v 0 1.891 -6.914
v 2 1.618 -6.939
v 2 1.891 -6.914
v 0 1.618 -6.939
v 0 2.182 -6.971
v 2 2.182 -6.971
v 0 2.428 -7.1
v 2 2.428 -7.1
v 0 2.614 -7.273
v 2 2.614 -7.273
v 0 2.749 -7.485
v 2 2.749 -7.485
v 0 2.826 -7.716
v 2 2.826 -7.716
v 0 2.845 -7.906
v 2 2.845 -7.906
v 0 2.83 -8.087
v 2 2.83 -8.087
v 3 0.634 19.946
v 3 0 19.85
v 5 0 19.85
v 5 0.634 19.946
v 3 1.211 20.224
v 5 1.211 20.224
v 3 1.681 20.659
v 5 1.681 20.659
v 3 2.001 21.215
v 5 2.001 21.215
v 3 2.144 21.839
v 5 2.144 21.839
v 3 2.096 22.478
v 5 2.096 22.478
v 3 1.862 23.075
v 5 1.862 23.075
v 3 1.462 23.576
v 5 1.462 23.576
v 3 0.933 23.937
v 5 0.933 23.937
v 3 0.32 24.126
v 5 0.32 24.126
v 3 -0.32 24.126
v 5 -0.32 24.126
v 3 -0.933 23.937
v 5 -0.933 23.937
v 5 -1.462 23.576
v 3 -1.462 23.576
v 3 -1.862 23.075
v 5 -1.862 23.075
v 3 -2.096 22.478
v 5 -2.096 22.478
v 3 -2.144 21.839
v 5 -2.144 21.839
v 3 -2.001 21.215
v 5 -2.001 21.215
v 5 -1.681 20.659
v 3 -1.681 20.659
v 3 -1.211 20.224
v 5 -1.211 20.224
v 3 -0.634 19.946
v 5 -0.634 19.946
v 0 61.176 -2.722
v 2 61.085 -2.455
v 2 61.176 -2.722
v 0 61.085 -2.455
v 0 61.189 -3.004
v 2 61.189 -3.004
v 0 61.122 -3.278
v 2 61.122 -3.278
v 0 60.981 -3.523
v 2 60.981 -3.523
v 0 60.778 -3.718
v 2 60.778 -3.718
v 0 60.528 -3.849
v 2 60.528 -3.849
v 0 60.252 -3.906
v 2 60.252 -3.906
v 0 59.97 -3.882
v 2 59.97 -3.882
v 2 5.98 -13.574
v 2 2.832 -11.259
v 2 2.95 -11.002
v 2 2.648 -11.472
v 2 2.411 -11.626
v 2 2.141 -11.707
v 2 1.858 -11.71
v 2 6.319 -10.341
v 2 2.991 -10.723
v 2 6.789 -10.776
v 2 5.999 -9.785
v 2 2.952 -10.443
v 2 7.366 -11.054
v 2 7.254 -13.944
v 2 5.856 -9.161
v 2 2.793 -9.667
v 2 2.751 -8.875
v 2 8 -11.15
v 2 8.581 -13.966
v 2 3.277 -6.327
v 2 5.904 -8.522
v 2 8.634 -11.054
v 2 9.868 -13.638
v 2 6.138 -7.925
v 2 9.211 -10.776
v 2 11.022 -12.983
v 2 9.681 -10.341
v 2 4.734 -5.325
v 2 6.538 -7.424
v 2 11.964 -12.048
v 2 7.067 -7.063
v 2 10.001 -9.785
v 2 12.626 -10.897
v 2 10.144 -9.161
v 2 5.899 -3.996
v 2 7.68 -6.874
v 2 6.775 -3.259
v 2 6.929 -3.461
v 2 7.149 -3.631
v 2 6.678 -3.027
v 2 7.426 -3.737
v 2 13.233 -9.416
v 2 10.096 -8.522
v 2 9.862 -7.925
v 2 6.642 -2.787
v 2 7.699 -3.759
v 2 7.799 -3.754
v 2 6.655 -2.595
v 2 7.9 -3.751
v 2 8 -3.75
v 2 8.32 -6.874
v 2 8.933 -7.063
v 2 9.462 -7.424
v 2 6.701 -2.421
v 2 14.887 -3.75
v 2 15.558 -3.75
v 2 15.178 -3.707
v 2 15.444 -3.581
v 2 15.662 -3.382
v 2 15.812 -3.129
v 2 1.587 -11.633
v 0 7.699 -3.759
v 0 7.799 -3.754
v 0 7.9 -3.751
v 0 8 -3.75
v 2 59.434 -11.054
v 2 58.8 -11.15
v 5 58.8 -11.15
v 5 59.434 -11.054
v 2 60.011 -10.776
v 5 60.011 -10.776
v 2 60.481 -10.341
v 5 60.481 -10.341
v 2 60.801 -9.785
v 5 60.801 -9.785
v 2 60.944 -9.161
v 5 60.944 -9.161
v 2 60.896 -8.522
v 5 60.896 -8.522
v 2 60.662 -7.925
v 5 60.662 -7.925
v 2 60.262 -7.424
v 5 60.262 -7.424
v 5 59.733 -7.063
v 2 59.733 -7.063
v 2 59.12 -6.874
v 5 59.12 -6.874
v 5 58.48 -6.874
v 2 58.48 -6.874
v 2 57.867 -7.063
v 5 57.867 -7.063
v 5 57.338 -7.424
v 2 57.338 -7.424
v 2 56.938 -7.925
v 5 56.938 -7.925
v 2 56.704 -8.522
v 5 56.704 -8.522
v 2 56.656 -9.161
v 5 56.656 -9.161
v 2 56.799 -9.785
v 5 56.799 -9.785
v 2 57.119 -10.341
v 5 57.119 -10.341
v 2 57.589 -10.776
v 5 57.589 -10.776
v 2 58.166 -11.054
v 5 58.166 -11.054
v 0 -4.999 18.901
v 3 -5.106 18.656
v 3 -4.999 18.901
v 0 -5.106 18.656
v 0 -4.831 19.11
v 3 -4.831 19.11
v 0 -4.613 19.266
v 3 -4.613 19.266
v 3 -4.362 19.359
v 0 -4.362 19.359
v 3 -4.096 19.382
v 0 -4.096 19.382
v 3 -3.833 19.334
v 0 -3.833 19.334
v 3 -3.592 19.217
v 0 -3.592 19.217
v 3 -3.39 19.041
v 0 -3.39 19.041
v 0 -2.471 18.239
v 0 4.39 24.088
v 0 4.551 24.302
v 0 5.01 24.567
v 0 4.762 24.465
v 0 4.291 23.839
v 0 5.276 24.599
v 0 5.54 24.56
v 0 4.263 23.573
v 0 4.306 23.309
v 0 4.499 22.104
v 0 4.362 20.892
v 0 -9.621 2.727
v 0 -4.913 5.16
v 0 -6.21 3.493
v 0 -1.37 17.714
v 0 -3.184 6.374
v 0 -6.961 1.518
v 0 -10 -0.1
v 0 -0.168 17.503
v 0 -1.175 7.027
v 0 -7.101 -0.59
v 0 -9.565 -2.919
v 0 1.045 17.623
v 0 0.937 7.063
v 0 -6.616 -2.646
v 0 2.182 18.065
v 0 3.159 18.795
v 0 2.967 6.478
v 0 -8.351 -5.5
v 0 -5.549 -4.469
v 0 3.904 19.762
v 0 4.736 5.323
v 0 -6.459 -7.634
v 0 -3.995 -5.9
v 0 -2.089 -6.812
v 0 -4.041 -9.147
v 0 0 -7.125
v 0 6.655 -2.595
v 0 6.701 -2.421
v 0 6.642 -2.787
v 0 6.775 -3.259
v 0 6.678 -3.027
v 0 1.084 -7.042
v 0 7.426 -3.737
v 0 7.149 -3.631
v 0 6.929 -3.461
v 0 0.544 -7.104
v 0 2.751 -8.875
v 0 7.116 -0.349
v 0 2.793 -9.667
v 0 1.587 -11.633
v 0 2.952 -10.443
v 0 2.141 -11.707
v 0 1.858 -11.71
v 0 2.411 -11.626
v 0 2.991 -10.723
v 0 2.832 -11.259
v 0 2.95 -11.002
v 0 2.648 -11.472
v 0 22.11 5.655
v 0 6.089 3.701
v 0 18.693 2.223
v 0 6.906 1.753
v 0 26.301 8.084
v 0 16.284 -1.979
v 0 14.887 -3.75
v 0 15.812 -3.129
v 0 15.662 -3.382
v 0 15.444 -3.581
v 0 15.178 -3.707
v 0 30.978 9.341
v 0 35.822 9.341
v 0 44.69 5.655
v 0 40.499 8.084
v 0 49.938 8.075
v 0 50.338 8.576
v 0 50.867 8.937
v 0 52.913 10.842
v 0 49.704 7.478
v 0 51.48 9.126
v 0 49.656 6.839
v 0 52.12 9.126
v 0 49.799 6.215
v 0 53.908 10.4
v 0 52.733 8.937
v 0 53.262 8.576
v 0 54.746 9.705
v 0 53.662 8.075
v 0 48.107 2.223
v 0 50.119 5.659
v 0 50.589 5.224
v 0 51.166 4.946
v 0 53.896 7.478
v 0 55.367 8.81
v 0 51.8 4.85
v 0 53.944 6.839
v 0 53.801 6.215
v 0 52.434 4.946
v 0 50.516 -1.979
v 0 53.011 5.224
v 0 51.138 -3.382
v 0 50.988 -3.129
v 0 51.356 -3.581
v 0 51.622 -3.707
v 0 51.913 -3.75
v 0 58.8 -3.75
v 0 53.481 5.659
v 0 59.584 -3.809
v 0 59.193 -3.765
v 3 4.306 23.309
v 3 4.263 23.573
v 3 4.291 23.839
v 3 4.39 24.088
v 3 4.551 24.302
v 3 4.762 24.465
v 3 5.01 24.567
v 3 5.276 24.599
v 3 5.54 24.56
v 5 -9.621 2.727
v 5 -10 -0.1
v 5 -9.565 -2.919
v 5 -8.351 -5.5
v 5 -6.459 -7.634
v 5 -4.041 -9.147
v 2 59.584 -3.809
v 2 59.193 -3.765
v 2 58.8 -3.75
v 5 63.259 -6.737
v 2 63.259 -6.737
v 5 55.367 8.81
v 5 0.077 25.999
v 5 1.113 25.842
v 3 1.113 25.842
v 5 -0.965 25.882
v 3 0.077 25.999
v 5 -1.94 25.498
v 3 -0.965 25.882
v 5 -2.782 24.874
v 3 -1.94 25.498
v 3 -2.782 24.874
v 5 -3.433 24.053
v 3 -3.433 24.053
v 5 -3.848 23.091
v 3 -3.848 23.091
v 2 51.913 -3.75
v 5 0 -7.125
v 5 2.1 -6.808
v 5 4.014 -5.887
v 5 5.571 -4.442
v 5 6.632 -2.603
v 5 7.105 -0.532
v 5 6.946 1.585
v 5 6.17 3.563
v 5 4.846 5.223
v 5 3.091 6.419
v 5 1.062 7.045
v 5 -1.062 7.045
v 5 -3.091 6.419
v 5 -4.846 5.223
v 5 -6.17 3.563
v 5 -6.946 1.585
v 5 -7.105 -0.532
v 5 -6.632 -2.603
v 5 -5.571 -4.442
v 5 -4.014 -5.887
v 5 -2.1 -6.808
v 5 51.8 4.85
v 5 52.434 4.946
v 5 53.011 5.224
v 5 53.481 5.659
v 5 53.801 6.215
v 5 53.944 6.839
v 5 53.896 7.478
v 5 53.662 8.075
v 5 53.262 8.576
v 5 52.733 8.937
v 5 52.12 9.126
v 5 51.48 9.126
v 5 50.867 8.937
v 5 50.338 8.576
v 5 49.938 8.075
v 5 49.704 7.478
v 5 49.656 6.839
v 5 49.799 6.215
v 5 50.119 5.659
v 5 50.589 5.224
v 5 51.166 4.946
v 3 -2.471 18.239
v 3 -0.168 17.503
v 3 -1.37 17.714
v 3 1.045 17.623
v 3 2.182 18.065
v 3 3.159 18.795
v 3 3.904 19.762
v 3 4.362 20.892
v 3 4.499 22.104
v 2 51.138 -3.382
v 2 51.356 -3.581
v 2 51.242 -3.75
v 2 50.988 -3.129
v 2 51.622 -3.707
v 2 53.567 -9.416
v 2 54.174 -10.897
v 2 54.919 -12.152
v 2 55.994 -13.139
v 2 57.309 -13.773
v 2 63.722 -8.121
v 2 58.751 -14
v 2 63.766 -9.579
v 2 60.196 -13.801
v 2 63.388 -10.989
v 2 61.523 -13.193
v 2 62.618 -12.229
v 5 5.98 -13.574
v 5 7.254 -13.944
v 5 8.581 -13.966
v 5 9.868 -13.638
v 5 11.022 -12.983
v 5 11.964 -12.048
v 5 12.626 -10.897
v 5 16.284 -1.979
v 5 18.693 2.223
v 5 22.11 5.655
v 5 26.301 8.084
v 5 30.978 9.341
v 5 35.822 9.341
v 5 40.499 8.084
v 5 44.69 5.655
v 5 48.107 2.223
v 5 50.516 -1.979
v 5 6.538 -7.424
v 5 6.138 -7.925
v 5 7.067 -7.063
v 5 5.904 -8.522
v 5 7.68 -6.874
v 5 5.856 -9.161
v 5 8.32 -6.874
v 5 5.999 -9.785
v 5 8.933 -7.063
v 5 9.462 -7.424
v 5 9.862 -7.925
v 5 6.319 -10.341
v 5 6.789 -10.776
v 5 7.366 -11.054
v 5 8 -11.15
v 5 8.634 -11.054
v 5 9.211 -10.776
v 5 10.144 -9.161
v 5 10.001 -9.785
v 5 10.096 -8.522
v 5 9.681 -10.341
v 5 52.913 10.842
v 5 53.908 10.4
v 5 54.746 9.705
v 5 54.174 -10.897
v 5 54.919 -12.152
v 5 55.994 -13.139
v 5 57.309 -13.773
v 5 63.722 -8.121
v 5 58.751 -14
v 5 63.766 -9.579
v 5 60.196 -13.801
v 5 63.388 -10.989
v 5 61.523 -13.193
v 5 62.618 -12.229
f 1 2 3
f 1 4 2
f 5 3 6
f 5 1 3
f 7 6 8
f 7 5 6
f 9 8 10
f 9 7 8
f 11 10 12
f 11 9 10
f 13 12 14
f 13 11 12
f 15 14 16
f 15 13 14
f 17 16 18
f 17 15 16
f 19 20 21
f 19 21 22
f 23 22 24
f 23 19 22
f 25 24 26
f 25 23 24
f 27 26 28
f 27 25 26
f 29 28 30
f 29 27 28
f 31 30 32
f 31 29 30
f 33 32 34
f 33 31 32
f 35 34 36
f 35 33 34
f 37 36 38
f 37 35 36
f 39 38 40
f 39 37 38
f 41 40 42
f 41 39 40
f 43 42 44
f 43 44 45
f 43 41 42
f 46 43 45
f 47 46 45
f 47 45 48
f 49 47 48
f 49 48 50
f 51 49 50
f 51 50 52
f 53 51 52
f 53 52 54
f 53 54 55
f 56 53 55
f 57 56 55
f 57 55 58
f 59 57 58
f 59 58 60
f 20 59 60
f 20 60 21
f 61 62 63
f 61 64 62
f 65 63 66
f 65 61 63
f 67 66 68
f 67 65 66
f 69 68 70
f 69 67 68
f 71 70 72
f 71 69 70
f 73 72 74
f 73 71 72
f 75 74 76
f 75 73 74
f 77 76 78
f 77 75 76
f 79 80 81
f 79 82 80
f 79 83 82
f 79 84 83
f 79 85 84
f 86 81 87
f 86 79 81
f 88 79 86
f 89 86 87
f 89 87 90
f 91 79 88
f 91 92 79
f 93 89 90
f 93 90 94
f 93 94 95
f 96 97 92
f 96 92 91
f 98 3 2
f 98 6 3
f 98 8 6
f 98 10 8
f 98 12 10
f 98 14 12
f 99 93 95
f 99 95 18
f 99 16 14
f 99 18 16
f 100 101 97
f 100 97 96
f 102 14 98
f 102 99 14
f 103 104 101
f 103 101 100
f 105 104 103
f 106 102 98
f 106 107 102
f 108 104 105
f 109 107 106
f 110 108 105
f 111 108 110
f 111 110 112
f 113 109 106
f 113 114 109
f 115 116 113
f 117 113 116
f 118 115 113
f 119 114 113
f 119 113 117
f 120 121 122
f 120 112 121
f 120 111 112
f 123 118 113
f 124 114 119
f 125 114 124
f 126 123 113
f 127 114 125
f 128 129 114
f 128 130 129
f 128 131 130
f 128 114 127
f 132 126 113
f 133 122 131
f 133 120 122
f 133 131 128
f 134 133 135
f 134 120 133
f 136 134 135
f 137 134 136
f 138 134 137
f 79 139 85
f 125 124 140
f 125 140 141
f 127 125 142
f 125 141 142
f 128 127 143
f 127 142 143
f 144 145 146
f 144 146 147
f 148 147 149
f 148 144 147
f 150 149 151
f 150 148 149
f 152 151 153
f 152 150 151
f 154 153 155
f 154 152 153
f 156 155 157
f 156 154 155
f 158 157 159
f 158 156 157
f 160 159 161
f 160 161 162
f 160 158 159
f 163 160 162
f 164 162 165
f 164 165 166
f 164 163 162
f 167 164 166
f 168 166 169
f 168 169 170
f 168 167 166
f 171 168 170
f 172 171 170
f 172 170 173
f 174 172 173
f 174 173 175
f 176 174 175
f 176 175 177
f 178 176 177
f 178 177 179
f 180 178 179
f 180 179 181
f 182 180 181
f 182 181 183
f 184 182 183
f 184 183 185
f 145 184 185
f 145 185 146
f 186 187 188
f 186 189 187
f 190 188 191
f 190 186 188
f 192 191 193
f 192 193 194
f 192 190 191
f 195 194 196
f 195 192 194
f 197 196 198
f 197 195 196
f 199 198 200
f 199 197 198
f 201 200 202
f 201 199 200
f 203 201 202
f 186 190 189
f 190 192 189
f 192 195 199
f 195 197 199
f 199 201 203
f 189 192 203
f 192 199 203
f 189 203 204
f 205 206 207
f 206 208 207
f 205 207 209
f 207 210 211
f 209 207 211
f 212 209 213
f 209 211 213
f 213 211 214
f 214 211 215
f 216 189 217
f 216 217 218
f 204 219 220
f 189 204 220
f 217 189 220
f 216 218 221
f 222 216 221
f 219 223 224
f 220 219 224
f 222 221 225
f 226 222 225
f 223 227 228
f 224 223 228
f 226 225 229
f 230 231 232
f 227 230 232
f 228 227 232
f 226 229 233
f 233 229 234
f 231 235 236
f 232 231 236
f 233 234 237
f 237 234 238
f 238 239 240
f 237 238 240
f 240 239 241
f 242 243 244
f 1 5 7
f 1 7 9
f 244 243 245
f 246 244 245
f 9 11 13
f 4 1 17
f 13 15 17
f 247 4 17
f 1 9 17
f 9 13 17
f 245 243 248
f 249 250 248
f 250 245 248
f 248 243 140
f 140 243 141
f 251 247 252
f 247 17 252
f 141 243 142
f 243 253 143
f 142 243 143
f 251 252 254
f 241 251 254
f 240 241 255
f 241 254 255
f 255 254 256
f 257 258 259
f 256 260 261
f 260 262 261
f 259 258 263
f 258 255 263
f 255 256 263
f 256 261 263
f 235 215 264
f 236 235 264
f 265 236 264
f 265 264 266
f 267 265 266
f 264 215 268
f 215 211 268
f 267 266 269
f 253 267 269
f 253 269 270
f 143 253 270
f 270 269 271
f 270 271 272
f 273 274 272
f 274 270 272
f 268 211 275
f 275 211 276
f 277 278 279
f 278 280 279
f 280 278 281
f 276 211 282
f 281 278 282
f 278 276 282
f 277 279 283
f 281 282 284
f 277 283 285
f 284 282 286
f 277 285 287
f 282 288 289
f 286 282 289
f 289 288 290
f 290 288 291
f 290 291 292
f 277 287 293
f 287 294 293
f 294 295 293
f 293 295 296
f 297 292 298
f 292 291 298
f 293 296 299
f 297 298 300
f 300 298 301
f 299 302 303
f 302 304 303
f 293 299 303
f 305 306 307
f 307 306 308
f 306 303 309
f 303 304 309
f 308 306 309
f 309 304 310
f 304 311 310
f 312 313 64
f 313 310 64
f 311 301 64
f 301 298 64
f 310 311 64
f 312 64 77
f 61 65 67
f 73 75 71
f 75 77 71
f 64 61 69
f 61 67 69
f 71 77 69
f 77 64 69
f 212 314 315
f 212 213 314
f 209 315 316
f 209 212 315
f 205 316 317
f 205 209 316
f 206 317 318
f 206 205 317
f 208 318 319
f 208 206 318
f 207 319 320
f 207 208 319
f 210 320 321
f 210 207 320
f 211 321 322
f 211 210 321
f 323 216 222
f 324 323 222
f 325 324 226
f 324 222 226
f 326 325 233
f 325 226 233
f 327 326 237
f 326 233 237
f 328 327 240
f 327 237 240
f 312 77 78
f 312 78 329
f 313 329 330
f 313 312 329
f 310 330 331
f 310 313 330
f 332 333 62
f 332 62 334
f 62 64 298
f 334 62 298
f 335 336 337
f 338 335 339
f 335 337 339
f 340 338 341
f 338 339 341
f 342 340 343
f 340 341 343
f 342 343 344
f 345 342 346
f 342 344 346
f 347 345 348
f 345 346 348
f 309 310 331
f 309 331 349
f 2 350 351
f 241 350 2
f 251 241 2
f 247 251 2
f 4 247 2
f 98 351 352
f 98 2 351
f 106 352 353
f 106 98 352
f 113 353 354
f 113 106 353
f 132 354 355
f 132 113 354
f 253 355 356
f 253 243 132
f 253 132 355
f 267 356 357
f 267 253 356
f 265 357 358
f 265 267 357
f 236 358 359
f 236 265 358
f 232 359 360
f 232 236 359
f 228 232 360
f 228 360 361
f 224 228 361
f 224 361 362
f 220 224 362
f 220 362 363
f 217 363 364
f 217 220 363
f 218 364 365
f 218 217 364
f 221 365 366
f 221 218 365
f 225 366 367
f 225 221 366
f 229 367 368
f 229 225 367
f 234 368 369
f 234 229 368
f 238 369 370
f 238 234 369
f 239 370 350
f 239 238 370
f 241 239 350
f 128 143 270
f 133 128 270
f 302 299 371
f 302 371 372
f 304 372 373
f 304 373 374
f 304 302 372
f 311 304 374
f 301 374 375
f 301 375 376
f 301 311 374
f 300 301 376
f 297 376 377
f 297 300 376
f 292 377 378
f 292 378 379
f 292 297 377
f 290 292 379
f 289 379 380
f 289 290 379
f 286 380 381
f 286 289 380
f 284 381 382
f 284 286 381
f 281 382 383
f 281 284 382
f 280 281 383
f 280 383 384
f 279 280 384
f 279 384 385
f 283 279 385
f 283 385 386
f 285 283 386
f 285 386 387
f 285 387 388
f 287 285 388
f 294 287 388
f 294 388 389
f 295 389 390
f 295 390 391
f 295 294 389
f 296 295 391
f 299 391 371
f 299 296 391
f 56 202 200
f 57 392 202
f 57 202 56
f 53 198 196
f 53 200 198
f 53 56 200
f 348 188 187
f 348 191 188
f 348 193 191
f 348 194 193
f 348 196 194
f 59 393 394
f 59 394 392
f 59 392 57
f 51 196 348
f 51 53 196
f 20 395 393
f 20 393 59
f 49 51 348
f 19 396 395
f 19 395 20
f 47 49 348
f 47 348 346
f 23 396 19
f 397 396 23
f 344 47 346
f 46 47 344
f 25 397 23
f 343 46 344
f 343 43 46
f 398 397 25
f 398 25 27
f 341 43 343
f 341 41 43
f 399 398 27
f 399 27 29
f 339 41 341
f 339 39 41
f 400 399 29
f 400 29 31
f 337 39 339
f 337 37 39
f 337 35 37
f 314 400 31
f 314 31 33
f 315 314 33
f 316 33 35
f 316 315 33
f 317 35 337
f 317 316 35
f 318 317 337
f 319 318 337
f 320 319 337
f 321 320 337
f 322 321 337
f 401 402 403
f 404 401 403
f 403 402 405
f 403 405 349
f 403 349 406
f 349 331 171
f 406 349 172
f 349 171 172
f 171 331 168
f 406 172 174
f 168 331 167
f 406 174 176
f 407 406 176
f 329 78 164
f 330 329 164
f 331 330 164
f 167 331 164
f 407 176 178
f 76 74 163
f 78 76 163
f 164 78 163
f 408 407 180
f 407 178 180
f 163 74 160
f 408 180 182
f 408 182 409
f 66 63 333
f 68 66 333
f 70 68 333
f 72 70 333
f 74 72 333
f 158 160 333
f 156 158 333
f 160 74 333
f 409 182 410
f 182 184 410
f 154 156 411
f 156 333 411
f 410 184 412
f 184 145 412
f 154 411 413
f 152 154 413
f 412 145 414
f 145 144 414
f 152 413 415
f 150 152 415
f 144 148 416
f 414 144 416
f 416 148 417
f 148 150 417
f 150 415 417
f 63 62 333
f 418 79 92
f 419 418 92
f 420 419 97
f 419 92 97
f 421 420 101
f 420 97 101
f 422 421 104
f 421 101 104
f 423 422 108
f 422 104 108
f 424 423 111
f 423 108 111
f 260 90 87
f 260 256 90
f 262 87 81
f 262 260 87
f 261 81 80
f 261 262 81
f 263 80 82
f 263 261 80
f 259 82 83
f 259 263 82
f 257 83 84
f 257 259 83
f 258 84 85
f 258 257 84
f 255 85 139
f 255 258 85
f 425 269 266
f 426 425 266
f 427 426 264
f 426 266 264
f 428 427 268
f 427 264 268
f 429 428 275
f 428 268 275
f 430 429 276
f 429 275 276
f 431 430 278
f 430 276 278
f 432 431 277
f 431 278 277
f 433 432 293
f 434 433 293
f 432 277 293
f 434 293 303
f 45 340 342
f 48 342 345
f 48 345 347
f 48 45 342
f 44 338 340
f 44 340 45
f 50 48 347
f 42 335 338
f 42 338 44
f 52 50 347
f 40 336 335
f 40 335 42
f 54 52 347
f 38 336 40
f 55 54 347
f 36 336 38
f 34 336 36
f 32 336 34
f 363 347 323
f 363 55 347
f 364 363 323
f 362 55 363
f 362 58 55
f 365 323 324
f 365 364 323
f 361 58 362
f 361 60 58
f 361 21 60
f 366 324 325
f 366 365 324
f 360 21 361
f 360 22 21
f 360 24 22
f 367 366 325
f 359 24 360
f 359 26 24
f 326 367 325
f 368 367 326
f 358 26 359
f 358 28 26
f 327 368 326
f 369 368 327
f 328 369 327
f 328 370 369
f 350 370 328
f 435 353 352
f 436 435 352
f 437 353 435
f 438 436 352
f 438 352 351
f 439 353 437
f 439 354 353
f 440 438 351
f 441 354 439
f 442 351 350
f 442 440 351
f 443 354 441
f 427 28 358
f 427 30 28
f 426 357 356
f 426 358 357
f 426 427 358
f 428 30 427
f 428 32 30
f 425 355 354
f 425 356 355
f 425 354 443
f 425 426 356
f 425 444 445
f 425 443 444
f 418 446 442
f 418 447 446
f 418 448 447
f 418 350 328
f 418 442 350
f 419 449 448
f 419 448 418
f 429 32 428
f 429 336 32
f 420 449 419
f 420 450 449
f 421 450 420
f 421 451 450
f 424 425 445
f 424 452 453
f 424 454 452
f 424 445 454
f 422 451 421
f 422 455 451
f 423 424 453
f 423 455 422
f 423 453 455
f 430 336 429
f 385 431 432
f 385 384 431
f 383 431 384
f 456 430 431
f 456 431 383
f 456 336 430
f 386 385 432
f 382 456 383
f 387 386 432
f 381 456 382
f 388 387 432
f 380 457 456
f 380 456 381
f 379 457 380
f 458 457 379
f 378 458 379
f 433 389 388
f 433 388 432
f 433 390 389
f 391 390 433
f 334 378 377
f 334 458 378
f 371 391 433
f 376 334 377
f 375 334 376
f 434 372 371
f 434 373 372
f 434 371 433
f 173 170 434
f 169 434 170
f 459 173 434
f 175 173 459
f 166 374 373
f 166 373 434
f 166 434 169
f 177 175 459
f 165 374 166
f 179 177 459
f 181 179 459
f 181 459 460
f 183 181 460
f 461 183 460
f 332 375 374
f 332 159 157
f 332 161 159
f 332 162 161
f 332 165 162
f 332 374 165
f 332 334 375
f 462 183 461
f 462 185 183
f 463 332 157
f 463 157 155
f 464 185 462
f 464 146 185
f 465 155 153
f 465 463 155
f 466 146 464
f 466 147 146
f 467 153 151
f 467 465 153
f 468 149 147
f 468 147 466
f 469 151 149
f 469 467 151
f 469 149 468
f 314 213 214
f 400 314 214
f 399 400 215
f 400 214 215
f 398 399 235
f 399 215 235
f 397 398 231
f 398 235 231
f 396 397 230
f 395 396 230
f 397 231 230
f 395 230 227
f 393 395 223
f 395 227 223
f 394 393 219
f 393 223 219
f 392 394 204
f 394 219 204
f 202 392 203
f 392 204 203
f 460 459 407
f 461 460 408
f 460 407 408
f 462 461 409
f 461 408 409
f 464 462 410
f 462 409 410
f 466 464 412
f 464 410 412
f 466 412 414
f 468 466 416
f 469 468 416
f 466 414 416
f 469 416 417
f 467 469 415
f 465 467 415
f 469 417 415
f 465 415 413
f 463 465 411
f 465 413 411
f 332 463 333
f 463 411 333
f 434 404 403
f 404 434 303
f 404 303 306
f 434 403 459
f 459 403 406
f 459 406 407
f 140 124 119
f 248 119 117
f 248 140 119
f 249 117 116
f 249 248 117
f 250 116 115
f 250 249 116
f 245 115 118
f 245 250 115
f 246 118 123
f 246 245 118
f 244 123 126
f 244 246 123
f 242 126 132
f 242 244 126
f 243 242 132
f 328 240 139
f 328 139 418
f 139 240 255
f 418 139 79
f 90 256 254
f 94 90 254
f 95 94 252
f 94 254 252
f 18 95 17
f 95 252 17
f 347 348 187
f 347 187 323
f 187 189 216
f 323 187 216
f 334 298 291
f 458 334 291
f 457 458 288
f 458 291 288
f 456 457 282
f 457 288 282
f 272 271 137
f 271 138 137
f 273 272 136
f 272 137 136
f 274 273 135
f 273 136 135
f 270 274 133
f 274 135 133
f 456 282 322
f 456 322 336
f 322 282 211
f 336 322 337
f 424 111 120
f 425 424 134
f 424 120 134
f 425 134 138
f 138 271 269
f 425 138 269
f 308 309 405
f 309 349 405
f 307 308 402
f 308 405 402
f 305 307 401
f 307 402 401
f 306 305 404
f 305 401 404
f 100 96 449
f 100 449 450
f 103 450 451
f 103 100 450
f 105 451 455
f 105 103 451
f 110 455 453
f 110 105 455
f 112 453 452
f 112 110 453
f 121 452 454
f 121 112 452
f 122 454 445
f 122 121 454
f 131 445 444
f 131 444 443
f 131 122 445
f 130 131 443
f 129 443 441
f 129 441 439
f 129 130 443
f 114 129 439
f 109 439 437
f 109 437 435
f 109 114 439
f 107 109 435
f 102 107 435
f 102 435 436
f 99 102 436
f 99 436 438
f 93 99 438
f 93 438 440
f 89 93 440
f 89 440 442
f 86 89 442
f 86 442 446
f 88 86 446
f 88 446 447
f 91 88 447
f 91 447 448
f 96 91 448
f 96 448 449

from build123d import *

# Parameters (mm, degrees)
SKETCH_1_R          = 2.15
SKETCH_1_R_2        = 7.125
EXTRUDE_1_DEPTH     = 5
SKETCH_2_R          = 4.5
CUT_EXTRUDE_1_DEPTH = 3
FILLET_1_R          = 1
CUT_EXTRUDE_2_DEPTH = 2
FILLET_2_R          = 1


with BuildPart() as part:
    # 草图1 → 凸台-拉伸1 (new body)
    with BuildSketch(Plane(origin=(0, 0, 0), x_dir=(0, 0, -1), z_dir=(1, 0, 0))):
        with BuildLine():
            Line((-23.090909091, -3.848365543), (-2.727272727, -9.620913858))
            ThreePointArc((-2.727272727, -9.620913858), (4.253098654, -9.050477989), (9.147283393, -4.040693817))
            Line((9.147283393, -4.040693817), (13.573641697, 5.979653091))
            ThreePointArc((13.573641697, 5.979653091), (13.638118854, 9.867579581), (10.897437667, 12.625984252))
            Line((10.897437667, 12.625984252), (1.979480632, 16.283858268))
            ThreePointArc((1.979480632, 16.283858268), (-9.5, 33.4), (1.979480632, 50.516141732))
            Line((1.979480632, 50.516141732), (10.897437667, 54.174015748))
            ThreePointArc((10.897437667, 54.174015748), (13.545928712, 60.881953925), (6.736898846, 63.258516924))
            Line((6.736898846, 63.258516924), (-8.810480924, 55.366813539))
            ThreePointArc((-8.810480924, 55.366813539), (-10.081211961, 54.350712224), (-10.842152772, 52.912592502))
            Line((-10.842152772, 52.912592502), (-25.842152772, 1.112592502))
            ThreePointArc((-25.842152772, 1.112592502), (-25.498078189, -1.939961078), (-23.090909091, -3.848365543))
        make_face()
        with Locations((9, 58.8)):
            Circle(SKETCH_1_R, mode=Mode.SUBTRACT)
        with Locations((-22, 0)):
            Circle(SKETCH_1_R, mode=Mode.SUBTRACT)
        with Locations((-7, 51.8)):
            Circle(SKETCH_1_R, mode=Mode.SUBTRACT)
        with Locations((9, 8)):
            Circle(SKETCH_1_R, mode=Mode.SUBTRACT)
        Circle(SKETCH_1_R_2, mode=Mode.SUBTRACT)
    extrude(amount=EXTRUDE_1_DEPTH)

    # 草图2 → 切除-拉伸1 (cut)
    with BuildSketch(Plane.ZY):
        with Locations((22, 0)):
            Circle(SKETCH_2_R)
    extrude(amount=-CUT_EXTRUDE_1_DEPTH, mode=Mode.SUBTRACT)

    # 圆角1
    fillet_1_edges = [part.edges().sort_by_distance(p)[0] for p in [
        (1.5, 3.092792715, 25.268735722),
        (1.5, -4.41060722, 21.107506888),
    ]]
    fillet(fillet_1_edges, radius=FILLET_1_R)

    # 草图3 → 切除-拉伸2 (cut)
    with BuildSketch(Plane.ZY):
        with BuildLine():
            Line((-3.75, 58.8), (-3.75, 51.242354784))
            Line((-3.75, 51.242354784), (-9.416400073, 53.566539292))
            ThreePointArc((-9.416400073, 53.566539292), (-12.562049945, 62.65672143), (-3.75, 58.8))
        make_face()
        with BuildLine():
            Line((-3.75, 8), (-3.75, 15.557645216))
            Line((-3.75, 15.557645216), (-9.416400073, 13.233460708))
            ThreePointArc((-9.416400073, 13.233460708), (-12.562049945, 4.14327857), (-3.75, 8))
        make_face()
    extrude(amount=-CUT_EXTRUDE_2_DEPTH, mode=Mode.SUBTRACT)

    # 圆角2
    fillet_2_edges = [part.edges().sort_by_distance(p)[0] for p in [
        (1, 5.693326891, -4.283883041),
        (1, 3.586845523, -6.156310924),
        (1, 62.533971032, -5.309476957),
        (1, 4.515373291, -12.926815084),
        (1, 15.557645216, -3.75),
        (1, 51.242354784, -3.75),
    ]]
    fillet(fillet_2_edges, radius=FILLET_2_R)


solid = part.part
